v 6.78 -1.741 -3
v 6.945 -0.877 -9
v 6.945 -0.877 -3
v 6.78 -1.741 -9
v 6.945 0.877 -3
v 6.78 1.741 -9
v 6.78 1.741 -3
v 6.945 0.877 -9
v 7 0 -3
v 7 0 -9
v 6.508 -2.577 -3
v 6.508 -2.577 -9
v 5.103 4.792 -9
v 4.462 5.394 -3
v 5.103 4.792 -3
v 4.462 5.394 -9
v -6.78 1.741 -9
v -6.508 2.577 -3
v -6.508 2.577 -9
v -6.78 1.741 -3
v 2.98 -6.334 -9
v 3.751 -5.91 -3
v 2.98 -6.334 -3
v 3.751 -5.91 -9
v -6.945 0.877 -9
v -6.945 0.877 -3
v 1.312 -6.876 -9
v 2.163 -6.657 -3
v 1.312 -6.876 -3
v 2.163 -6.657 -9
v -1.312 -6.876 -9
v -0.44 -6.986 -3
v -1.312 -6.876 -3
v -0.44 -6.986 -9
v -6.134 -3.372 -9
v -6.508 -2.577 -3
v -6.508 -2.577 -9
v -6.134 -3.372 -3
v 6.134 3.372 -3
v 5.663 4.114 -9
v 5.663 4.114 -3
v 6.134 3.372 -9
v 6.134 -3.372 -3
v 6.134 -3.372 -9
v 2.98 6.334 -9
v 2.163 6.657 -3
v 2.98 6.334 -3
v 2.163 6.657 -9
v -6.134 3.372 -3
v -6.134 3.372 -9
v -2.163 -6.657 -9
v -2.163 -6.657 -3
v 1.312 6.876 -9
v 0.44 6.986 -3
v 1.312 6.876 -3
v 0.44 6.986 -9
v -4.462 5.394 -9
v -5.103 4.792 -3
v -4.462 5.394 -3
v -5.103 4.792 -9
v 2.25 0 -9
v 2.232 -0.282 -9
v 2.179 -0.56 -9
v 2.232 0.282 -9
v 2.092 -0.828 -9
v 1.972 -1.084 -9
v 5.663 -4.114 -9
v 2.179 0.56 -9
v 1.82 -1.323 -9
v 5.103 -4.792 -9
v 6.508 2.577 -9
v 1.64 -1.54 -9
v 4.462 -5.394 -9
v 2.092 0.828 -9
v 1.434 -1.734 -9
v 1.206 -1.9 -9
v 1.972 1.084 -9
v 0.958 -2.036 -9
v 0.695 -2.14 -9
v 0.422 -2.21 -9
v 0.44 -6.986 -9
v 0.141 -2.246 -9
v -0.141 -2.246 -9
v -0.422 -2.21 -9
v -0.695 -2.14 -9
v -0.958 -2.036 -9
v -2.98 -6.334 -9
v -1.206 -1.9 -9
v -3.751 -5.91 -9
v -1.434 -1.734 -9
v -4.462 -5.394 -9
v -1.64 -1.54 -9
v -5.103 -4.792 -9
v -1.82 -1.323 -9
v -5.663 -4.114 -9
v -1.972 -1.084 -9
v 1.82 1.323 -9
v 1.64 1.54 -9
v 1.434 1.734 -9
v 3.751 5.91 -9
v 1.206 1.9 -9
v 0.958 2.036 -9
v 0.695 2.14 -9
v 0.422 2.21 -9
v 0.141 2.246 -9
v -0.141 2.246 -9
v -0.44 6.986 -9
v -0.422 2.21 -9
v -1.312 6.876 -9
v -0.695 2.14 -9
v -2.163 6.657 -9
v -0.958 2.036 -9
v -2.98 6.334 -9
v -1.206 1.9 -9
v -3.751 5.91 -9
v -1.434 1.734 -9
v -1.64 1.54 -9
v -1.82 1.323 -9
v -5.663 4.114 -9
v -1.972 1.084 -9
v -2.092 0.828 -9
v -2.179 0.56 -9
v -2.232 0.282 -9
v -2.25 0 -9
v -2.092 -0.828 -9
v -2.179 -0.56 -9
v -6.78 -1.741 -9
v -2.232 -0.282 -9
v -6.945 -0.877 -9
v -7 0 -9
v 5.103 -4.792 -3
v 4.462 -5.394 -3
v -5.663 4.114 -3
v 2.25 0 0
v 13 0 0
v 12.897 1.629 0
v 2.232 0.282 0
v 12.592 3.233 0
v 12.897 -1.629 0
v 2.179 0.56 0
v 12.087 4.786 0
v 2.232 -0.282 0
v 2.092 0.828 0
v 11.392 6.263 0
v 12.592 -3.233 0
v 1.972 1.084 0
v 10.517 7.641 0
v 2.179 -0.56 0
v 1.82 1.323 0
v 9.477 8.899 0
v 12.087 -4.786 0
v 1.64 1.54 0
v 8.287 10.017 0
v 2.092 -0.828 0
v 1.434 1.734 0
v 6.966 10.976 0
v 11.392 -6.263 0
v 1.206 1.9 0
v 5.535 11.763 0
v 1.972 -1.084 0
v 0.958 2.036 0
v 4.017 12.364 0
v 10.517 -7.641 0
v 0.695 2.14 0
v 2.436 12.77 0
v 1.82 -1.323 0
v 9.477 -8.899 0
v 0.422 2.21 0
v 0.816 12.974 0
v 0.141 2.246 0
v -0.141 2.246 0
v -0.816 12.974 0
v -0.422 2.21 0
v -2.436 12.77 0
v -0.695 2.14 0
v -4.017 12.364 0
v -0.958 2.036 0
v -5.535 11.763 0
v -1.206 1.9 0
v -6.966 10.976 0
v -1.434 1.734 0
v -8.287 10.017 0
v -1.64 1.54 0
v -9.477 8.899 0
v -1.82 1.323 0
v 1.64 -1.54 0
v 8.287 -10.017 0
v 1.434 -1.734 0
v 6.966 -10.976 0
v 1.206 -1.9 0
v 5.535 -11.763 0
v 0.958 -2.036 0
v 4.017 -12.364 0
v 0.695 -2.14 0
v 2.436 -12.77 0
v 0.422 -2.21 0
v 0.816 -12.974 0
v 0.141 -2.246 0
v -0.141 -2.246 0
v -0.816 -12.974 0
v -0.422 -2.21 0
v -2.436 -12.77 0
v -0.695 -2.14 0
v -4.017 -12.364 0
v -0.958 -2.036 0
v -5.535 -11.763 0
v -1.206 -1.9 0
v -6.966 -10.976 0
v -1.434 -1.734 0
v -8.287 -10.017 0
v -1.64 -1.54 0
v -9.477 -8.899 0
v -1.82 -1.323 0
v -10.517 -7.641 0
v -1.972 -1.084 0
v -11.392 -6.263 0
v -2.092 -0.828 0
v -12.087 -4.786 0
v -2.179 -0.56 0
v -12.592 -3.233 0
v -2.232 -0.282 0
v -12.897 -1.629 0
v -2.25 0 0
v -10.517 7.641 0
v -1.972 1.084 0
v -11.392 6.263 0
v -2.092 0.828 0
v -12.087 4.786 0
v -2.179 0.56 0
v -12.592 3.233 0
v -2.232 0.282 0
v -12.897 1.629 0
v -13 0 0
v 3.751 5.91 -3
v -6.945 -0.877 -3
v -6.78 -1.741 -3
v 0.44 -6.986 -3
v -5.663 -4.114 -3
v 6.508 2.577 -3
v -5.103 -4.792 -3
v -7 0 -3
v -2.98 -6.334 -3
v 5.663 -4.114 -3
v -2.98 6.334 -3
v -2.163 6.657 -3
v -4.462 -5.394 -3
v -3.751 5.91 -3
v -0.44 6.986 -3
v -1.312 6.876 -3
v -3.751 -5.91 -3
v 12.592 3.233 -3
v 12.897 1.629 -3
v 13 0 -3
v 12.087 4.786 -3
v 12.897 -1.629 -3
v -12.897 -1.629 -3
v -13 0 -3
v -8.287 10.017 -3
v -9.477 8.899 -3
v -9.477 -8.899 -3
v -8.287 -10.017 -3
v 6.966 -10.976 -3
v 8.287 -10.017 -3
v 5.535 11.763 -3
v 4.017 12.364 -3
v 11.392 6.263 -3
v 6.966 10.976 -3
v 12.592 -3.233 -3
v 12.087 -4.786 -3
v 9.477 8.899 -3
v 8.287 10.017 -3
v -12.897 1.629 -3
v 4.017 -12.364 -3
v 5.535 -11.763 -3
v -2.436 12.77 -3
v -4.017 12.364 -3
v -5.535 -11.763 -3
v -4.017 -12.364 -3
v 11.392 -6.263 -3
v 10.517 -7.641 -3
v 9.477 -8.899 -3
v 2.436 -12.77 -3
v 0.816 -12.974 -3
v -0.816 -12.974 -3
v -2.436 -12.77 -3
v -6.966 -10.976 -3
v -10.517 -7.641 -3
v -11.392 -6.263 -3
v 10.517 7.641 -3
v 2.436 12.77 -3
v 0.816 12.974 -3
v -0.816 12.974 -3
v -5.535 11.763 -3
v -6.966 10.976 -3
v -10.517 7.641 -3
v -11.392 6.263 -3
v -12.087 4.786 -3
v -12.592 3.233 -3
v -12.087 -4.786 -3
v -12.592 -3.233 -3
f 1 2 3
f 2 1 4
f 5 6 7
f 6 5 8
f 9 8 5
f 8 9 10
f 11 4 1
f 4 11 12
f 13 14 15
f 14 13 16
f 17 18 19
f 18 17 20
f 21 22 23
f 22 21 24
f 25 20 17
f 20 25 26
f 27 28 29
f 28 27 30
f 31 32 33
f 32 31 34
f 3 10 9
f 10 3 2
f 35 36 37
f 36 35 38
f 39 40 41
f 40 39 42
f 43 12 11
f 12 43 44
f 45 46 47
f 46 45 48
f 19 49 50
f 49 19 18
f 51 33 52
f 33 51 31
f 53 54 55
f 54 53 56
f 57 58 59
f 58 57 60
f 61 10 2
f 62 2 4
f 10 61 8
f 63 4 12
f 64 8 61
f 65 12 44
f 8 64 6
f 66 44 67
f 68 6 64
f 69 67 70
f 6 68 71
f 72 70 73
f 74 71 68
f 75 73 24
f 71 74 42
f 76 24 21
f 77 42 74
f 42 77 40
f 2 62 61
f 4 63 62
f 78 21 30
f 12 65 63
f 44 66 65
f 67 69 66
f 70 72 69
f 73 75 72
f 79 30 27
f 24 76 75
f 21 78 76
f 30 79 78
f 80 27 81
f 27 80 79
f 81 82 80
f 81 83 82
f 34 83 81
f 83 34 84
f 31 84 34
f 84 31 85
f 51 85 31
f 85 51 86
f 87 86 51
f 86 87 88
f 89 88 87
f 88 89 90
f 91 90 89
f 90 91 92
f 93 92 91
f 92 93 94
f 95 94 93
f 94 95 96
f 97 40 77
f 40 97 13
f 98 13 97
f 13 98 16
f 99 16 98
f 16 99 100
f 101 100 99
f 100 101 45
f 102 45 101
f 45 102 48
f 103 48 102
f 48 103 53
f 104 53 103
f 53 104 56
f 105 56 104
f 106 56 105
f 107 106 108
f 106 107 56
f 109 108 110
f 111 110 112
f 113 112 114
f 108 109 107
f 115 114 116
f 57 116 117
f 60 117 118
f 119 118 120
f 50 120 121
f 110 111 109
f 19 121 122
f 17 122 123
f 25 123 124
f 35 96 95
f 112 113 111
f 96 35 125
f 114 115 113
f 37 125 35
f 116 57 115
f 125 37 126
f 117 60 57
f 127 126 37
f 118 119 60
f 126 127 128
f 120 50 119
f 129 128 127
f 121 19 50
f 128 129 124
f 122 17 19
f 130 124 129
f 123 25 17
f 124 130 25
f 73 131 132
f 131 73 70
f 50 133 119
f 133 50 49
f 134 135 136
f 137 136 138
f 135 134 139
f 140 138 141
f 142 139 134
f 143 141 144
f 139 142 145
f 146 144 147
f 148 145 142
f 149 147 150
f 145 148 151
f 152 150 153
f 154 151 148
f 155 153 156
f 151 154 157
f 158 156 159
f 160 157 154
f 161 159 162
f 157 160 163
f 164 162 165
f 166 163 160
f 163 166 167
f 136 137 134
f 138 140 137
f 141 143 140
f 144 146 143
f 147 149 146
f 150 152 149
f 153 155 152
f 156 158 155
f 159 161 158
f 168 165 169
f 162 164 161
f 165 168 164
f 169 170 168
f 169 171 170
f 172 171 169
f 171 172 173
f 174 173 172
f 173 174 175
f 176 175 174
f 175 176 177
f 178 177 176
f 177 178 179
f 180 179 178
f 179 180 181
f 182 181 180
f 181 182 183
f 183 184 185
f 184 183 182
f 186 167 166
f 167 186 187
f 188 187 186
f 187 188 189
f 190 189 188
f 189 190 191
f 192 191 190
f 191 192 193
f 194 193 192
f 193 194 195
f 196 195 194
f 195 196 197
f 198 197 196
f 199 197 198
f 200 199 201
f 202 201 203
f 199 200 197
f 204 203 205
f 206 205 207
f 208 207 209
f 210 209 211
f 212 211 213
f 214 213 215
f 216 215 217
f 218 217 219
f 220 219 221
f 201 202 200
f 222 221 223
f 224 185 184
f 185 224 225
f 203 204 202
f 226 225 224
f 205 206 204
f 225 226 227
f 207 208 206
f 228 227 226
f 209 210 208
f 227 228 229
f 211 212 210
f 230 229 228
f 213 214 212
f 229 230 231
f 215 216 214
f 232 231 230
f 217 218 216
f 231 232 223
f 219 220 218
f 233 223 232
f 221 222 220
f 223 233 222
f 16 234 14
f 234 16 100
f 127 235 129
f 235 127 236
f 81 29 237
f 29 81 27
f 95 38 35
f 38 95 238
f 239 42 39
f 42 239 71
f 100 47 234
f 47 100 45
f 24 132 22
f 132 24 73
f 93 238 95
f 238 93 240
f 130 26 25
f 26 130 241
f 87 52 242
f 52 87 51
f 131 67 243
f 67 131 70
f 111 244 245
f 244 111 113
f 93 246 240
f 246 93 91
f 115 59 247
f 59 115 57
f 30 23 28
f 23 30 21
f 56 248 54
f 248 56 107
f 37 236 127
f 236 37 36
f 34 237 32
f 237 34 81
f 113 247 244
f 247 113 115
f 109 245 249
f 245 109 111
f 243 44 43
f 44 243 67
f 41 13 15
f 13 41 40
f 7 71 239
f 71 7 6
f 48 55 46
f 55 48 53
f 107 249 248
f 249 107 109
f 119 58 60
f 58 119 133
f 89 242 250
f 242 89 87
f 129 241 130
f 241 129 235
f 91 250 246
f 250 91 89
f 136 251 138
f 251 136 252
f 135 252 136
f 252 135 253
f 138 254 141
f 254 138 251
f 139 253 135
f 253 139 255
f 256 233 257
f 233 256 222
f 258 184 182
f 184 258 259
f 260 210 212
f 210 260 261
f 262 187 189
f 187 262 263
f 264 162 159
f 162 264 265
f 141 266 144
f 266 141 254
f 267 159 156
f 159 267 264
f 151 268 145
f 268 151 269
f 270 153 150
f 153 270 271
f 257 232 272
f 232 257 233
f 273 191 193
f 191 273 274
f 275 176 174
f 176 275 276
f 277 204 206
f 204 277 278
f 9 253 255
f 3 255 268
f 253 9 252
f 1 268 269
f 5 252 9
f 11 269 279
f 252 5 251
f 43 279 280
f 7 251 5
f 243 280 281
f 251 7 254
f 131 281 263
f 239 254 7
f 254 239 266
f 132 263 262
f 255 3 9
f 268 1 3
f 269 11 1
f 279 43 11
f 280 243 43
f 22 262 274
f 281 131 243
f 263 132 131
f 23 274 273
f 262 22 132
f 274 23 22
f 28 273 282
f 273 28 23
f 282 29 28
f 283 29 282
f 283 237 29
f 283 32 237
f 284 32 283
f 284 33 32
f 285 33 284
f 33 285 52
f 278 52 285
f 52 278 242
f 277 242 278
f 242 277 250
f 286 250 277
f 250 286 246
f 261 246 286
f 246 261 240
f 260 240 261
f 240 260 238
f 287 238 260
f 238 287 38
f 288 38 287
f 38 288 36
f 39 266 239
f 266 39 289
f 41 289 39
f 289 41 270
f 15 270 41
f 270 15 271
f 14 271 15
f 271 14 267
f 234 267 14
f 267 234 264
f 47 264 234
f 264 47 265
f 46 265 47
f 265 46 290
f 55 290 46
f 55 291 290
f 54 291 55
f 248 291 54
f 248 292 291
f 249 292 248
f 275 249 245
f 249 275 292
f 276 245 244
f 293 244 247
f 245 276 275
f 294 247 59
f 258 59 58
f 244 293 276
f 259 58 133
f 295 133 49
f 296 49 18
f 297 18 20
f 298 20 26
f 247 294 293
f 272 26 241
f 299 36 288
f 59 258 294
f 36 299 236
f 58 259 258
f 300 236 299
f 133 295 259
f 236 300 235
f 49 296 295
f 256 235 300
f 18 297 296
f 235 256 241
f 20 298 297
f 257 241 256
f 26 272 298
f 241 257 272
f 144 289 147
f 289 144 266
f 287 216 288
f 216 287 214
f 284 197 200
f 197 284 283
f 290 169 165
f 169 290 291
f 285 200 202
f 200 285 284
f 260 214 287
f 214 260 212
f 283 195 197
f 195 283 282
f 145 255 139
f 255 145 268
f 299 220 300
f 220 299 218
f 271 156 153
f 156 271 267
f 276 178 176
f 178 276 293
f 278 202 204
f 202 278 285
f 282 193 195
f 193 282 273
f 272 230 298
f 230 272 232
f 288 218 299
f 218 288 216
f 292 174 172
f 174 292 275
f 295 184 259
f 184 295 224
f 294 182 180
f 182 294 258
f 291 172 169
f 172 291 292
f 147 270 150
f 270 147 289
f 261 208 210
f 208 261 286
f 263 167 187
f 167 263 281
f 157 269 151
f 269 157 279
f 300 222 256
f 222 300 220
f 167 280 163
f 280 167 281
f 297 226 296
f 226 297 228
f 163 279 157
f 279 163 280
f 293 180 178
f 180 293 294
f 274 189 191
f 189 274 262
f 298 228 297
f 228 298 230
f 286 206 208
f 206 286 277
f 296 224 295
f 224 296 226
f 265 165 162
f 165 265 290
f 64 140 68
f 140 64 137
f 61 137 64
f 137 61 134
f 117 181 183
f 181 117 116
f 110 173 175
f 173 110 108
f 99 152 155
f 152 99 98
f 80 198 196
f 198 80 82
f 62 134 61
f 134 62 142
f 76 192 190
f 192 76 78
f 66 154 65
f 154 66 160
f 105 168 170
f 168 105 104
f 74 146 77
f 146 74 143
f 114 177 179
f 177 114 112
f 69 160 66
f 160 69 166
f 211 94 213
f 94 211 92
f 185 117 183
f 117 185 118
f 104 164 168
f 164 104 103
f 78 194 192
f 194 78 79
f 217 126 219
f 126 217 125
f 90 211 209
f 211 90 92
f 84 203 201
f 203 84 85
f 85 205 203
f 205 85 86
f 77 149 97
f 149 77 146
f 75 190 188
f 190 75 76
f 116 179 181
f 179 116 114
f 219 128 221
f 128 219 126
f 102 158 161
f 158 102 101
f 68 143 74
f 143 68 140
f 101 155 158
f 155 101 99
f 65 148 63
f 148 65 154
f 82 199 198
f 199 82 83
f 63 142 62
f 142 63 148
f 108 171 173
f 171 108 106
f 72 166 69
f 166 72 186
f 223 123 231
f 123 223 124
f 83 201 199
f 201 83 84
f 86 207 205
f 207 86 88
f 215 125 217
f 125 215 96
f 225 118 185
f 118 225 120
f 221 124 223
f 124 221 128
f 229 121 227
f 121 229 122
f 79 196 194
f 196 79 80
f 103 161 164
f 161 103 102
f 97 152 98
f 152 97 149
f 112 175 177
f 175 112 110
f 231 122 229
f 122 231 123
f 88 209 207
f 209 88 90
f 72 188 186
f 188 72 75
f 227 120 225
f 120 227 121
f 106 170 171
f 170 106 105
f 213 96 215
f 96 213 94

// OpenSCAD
$fn = 50;


difference() {
	union() {
		translate(v = [0, 0, -9.0000000000]) {
			cylinder(h = 9, r = 7.0000000000);
		}
		translate(v = [0, 0, -3.0000000000]) {
			cylinder(h = 3, r = 13.0000000000);
		}
	}
	union() {
		#translate(v = [0, 0, -9]) {
			cylinder(h = 9, r = 2.2500000000);
		}
	}
}
